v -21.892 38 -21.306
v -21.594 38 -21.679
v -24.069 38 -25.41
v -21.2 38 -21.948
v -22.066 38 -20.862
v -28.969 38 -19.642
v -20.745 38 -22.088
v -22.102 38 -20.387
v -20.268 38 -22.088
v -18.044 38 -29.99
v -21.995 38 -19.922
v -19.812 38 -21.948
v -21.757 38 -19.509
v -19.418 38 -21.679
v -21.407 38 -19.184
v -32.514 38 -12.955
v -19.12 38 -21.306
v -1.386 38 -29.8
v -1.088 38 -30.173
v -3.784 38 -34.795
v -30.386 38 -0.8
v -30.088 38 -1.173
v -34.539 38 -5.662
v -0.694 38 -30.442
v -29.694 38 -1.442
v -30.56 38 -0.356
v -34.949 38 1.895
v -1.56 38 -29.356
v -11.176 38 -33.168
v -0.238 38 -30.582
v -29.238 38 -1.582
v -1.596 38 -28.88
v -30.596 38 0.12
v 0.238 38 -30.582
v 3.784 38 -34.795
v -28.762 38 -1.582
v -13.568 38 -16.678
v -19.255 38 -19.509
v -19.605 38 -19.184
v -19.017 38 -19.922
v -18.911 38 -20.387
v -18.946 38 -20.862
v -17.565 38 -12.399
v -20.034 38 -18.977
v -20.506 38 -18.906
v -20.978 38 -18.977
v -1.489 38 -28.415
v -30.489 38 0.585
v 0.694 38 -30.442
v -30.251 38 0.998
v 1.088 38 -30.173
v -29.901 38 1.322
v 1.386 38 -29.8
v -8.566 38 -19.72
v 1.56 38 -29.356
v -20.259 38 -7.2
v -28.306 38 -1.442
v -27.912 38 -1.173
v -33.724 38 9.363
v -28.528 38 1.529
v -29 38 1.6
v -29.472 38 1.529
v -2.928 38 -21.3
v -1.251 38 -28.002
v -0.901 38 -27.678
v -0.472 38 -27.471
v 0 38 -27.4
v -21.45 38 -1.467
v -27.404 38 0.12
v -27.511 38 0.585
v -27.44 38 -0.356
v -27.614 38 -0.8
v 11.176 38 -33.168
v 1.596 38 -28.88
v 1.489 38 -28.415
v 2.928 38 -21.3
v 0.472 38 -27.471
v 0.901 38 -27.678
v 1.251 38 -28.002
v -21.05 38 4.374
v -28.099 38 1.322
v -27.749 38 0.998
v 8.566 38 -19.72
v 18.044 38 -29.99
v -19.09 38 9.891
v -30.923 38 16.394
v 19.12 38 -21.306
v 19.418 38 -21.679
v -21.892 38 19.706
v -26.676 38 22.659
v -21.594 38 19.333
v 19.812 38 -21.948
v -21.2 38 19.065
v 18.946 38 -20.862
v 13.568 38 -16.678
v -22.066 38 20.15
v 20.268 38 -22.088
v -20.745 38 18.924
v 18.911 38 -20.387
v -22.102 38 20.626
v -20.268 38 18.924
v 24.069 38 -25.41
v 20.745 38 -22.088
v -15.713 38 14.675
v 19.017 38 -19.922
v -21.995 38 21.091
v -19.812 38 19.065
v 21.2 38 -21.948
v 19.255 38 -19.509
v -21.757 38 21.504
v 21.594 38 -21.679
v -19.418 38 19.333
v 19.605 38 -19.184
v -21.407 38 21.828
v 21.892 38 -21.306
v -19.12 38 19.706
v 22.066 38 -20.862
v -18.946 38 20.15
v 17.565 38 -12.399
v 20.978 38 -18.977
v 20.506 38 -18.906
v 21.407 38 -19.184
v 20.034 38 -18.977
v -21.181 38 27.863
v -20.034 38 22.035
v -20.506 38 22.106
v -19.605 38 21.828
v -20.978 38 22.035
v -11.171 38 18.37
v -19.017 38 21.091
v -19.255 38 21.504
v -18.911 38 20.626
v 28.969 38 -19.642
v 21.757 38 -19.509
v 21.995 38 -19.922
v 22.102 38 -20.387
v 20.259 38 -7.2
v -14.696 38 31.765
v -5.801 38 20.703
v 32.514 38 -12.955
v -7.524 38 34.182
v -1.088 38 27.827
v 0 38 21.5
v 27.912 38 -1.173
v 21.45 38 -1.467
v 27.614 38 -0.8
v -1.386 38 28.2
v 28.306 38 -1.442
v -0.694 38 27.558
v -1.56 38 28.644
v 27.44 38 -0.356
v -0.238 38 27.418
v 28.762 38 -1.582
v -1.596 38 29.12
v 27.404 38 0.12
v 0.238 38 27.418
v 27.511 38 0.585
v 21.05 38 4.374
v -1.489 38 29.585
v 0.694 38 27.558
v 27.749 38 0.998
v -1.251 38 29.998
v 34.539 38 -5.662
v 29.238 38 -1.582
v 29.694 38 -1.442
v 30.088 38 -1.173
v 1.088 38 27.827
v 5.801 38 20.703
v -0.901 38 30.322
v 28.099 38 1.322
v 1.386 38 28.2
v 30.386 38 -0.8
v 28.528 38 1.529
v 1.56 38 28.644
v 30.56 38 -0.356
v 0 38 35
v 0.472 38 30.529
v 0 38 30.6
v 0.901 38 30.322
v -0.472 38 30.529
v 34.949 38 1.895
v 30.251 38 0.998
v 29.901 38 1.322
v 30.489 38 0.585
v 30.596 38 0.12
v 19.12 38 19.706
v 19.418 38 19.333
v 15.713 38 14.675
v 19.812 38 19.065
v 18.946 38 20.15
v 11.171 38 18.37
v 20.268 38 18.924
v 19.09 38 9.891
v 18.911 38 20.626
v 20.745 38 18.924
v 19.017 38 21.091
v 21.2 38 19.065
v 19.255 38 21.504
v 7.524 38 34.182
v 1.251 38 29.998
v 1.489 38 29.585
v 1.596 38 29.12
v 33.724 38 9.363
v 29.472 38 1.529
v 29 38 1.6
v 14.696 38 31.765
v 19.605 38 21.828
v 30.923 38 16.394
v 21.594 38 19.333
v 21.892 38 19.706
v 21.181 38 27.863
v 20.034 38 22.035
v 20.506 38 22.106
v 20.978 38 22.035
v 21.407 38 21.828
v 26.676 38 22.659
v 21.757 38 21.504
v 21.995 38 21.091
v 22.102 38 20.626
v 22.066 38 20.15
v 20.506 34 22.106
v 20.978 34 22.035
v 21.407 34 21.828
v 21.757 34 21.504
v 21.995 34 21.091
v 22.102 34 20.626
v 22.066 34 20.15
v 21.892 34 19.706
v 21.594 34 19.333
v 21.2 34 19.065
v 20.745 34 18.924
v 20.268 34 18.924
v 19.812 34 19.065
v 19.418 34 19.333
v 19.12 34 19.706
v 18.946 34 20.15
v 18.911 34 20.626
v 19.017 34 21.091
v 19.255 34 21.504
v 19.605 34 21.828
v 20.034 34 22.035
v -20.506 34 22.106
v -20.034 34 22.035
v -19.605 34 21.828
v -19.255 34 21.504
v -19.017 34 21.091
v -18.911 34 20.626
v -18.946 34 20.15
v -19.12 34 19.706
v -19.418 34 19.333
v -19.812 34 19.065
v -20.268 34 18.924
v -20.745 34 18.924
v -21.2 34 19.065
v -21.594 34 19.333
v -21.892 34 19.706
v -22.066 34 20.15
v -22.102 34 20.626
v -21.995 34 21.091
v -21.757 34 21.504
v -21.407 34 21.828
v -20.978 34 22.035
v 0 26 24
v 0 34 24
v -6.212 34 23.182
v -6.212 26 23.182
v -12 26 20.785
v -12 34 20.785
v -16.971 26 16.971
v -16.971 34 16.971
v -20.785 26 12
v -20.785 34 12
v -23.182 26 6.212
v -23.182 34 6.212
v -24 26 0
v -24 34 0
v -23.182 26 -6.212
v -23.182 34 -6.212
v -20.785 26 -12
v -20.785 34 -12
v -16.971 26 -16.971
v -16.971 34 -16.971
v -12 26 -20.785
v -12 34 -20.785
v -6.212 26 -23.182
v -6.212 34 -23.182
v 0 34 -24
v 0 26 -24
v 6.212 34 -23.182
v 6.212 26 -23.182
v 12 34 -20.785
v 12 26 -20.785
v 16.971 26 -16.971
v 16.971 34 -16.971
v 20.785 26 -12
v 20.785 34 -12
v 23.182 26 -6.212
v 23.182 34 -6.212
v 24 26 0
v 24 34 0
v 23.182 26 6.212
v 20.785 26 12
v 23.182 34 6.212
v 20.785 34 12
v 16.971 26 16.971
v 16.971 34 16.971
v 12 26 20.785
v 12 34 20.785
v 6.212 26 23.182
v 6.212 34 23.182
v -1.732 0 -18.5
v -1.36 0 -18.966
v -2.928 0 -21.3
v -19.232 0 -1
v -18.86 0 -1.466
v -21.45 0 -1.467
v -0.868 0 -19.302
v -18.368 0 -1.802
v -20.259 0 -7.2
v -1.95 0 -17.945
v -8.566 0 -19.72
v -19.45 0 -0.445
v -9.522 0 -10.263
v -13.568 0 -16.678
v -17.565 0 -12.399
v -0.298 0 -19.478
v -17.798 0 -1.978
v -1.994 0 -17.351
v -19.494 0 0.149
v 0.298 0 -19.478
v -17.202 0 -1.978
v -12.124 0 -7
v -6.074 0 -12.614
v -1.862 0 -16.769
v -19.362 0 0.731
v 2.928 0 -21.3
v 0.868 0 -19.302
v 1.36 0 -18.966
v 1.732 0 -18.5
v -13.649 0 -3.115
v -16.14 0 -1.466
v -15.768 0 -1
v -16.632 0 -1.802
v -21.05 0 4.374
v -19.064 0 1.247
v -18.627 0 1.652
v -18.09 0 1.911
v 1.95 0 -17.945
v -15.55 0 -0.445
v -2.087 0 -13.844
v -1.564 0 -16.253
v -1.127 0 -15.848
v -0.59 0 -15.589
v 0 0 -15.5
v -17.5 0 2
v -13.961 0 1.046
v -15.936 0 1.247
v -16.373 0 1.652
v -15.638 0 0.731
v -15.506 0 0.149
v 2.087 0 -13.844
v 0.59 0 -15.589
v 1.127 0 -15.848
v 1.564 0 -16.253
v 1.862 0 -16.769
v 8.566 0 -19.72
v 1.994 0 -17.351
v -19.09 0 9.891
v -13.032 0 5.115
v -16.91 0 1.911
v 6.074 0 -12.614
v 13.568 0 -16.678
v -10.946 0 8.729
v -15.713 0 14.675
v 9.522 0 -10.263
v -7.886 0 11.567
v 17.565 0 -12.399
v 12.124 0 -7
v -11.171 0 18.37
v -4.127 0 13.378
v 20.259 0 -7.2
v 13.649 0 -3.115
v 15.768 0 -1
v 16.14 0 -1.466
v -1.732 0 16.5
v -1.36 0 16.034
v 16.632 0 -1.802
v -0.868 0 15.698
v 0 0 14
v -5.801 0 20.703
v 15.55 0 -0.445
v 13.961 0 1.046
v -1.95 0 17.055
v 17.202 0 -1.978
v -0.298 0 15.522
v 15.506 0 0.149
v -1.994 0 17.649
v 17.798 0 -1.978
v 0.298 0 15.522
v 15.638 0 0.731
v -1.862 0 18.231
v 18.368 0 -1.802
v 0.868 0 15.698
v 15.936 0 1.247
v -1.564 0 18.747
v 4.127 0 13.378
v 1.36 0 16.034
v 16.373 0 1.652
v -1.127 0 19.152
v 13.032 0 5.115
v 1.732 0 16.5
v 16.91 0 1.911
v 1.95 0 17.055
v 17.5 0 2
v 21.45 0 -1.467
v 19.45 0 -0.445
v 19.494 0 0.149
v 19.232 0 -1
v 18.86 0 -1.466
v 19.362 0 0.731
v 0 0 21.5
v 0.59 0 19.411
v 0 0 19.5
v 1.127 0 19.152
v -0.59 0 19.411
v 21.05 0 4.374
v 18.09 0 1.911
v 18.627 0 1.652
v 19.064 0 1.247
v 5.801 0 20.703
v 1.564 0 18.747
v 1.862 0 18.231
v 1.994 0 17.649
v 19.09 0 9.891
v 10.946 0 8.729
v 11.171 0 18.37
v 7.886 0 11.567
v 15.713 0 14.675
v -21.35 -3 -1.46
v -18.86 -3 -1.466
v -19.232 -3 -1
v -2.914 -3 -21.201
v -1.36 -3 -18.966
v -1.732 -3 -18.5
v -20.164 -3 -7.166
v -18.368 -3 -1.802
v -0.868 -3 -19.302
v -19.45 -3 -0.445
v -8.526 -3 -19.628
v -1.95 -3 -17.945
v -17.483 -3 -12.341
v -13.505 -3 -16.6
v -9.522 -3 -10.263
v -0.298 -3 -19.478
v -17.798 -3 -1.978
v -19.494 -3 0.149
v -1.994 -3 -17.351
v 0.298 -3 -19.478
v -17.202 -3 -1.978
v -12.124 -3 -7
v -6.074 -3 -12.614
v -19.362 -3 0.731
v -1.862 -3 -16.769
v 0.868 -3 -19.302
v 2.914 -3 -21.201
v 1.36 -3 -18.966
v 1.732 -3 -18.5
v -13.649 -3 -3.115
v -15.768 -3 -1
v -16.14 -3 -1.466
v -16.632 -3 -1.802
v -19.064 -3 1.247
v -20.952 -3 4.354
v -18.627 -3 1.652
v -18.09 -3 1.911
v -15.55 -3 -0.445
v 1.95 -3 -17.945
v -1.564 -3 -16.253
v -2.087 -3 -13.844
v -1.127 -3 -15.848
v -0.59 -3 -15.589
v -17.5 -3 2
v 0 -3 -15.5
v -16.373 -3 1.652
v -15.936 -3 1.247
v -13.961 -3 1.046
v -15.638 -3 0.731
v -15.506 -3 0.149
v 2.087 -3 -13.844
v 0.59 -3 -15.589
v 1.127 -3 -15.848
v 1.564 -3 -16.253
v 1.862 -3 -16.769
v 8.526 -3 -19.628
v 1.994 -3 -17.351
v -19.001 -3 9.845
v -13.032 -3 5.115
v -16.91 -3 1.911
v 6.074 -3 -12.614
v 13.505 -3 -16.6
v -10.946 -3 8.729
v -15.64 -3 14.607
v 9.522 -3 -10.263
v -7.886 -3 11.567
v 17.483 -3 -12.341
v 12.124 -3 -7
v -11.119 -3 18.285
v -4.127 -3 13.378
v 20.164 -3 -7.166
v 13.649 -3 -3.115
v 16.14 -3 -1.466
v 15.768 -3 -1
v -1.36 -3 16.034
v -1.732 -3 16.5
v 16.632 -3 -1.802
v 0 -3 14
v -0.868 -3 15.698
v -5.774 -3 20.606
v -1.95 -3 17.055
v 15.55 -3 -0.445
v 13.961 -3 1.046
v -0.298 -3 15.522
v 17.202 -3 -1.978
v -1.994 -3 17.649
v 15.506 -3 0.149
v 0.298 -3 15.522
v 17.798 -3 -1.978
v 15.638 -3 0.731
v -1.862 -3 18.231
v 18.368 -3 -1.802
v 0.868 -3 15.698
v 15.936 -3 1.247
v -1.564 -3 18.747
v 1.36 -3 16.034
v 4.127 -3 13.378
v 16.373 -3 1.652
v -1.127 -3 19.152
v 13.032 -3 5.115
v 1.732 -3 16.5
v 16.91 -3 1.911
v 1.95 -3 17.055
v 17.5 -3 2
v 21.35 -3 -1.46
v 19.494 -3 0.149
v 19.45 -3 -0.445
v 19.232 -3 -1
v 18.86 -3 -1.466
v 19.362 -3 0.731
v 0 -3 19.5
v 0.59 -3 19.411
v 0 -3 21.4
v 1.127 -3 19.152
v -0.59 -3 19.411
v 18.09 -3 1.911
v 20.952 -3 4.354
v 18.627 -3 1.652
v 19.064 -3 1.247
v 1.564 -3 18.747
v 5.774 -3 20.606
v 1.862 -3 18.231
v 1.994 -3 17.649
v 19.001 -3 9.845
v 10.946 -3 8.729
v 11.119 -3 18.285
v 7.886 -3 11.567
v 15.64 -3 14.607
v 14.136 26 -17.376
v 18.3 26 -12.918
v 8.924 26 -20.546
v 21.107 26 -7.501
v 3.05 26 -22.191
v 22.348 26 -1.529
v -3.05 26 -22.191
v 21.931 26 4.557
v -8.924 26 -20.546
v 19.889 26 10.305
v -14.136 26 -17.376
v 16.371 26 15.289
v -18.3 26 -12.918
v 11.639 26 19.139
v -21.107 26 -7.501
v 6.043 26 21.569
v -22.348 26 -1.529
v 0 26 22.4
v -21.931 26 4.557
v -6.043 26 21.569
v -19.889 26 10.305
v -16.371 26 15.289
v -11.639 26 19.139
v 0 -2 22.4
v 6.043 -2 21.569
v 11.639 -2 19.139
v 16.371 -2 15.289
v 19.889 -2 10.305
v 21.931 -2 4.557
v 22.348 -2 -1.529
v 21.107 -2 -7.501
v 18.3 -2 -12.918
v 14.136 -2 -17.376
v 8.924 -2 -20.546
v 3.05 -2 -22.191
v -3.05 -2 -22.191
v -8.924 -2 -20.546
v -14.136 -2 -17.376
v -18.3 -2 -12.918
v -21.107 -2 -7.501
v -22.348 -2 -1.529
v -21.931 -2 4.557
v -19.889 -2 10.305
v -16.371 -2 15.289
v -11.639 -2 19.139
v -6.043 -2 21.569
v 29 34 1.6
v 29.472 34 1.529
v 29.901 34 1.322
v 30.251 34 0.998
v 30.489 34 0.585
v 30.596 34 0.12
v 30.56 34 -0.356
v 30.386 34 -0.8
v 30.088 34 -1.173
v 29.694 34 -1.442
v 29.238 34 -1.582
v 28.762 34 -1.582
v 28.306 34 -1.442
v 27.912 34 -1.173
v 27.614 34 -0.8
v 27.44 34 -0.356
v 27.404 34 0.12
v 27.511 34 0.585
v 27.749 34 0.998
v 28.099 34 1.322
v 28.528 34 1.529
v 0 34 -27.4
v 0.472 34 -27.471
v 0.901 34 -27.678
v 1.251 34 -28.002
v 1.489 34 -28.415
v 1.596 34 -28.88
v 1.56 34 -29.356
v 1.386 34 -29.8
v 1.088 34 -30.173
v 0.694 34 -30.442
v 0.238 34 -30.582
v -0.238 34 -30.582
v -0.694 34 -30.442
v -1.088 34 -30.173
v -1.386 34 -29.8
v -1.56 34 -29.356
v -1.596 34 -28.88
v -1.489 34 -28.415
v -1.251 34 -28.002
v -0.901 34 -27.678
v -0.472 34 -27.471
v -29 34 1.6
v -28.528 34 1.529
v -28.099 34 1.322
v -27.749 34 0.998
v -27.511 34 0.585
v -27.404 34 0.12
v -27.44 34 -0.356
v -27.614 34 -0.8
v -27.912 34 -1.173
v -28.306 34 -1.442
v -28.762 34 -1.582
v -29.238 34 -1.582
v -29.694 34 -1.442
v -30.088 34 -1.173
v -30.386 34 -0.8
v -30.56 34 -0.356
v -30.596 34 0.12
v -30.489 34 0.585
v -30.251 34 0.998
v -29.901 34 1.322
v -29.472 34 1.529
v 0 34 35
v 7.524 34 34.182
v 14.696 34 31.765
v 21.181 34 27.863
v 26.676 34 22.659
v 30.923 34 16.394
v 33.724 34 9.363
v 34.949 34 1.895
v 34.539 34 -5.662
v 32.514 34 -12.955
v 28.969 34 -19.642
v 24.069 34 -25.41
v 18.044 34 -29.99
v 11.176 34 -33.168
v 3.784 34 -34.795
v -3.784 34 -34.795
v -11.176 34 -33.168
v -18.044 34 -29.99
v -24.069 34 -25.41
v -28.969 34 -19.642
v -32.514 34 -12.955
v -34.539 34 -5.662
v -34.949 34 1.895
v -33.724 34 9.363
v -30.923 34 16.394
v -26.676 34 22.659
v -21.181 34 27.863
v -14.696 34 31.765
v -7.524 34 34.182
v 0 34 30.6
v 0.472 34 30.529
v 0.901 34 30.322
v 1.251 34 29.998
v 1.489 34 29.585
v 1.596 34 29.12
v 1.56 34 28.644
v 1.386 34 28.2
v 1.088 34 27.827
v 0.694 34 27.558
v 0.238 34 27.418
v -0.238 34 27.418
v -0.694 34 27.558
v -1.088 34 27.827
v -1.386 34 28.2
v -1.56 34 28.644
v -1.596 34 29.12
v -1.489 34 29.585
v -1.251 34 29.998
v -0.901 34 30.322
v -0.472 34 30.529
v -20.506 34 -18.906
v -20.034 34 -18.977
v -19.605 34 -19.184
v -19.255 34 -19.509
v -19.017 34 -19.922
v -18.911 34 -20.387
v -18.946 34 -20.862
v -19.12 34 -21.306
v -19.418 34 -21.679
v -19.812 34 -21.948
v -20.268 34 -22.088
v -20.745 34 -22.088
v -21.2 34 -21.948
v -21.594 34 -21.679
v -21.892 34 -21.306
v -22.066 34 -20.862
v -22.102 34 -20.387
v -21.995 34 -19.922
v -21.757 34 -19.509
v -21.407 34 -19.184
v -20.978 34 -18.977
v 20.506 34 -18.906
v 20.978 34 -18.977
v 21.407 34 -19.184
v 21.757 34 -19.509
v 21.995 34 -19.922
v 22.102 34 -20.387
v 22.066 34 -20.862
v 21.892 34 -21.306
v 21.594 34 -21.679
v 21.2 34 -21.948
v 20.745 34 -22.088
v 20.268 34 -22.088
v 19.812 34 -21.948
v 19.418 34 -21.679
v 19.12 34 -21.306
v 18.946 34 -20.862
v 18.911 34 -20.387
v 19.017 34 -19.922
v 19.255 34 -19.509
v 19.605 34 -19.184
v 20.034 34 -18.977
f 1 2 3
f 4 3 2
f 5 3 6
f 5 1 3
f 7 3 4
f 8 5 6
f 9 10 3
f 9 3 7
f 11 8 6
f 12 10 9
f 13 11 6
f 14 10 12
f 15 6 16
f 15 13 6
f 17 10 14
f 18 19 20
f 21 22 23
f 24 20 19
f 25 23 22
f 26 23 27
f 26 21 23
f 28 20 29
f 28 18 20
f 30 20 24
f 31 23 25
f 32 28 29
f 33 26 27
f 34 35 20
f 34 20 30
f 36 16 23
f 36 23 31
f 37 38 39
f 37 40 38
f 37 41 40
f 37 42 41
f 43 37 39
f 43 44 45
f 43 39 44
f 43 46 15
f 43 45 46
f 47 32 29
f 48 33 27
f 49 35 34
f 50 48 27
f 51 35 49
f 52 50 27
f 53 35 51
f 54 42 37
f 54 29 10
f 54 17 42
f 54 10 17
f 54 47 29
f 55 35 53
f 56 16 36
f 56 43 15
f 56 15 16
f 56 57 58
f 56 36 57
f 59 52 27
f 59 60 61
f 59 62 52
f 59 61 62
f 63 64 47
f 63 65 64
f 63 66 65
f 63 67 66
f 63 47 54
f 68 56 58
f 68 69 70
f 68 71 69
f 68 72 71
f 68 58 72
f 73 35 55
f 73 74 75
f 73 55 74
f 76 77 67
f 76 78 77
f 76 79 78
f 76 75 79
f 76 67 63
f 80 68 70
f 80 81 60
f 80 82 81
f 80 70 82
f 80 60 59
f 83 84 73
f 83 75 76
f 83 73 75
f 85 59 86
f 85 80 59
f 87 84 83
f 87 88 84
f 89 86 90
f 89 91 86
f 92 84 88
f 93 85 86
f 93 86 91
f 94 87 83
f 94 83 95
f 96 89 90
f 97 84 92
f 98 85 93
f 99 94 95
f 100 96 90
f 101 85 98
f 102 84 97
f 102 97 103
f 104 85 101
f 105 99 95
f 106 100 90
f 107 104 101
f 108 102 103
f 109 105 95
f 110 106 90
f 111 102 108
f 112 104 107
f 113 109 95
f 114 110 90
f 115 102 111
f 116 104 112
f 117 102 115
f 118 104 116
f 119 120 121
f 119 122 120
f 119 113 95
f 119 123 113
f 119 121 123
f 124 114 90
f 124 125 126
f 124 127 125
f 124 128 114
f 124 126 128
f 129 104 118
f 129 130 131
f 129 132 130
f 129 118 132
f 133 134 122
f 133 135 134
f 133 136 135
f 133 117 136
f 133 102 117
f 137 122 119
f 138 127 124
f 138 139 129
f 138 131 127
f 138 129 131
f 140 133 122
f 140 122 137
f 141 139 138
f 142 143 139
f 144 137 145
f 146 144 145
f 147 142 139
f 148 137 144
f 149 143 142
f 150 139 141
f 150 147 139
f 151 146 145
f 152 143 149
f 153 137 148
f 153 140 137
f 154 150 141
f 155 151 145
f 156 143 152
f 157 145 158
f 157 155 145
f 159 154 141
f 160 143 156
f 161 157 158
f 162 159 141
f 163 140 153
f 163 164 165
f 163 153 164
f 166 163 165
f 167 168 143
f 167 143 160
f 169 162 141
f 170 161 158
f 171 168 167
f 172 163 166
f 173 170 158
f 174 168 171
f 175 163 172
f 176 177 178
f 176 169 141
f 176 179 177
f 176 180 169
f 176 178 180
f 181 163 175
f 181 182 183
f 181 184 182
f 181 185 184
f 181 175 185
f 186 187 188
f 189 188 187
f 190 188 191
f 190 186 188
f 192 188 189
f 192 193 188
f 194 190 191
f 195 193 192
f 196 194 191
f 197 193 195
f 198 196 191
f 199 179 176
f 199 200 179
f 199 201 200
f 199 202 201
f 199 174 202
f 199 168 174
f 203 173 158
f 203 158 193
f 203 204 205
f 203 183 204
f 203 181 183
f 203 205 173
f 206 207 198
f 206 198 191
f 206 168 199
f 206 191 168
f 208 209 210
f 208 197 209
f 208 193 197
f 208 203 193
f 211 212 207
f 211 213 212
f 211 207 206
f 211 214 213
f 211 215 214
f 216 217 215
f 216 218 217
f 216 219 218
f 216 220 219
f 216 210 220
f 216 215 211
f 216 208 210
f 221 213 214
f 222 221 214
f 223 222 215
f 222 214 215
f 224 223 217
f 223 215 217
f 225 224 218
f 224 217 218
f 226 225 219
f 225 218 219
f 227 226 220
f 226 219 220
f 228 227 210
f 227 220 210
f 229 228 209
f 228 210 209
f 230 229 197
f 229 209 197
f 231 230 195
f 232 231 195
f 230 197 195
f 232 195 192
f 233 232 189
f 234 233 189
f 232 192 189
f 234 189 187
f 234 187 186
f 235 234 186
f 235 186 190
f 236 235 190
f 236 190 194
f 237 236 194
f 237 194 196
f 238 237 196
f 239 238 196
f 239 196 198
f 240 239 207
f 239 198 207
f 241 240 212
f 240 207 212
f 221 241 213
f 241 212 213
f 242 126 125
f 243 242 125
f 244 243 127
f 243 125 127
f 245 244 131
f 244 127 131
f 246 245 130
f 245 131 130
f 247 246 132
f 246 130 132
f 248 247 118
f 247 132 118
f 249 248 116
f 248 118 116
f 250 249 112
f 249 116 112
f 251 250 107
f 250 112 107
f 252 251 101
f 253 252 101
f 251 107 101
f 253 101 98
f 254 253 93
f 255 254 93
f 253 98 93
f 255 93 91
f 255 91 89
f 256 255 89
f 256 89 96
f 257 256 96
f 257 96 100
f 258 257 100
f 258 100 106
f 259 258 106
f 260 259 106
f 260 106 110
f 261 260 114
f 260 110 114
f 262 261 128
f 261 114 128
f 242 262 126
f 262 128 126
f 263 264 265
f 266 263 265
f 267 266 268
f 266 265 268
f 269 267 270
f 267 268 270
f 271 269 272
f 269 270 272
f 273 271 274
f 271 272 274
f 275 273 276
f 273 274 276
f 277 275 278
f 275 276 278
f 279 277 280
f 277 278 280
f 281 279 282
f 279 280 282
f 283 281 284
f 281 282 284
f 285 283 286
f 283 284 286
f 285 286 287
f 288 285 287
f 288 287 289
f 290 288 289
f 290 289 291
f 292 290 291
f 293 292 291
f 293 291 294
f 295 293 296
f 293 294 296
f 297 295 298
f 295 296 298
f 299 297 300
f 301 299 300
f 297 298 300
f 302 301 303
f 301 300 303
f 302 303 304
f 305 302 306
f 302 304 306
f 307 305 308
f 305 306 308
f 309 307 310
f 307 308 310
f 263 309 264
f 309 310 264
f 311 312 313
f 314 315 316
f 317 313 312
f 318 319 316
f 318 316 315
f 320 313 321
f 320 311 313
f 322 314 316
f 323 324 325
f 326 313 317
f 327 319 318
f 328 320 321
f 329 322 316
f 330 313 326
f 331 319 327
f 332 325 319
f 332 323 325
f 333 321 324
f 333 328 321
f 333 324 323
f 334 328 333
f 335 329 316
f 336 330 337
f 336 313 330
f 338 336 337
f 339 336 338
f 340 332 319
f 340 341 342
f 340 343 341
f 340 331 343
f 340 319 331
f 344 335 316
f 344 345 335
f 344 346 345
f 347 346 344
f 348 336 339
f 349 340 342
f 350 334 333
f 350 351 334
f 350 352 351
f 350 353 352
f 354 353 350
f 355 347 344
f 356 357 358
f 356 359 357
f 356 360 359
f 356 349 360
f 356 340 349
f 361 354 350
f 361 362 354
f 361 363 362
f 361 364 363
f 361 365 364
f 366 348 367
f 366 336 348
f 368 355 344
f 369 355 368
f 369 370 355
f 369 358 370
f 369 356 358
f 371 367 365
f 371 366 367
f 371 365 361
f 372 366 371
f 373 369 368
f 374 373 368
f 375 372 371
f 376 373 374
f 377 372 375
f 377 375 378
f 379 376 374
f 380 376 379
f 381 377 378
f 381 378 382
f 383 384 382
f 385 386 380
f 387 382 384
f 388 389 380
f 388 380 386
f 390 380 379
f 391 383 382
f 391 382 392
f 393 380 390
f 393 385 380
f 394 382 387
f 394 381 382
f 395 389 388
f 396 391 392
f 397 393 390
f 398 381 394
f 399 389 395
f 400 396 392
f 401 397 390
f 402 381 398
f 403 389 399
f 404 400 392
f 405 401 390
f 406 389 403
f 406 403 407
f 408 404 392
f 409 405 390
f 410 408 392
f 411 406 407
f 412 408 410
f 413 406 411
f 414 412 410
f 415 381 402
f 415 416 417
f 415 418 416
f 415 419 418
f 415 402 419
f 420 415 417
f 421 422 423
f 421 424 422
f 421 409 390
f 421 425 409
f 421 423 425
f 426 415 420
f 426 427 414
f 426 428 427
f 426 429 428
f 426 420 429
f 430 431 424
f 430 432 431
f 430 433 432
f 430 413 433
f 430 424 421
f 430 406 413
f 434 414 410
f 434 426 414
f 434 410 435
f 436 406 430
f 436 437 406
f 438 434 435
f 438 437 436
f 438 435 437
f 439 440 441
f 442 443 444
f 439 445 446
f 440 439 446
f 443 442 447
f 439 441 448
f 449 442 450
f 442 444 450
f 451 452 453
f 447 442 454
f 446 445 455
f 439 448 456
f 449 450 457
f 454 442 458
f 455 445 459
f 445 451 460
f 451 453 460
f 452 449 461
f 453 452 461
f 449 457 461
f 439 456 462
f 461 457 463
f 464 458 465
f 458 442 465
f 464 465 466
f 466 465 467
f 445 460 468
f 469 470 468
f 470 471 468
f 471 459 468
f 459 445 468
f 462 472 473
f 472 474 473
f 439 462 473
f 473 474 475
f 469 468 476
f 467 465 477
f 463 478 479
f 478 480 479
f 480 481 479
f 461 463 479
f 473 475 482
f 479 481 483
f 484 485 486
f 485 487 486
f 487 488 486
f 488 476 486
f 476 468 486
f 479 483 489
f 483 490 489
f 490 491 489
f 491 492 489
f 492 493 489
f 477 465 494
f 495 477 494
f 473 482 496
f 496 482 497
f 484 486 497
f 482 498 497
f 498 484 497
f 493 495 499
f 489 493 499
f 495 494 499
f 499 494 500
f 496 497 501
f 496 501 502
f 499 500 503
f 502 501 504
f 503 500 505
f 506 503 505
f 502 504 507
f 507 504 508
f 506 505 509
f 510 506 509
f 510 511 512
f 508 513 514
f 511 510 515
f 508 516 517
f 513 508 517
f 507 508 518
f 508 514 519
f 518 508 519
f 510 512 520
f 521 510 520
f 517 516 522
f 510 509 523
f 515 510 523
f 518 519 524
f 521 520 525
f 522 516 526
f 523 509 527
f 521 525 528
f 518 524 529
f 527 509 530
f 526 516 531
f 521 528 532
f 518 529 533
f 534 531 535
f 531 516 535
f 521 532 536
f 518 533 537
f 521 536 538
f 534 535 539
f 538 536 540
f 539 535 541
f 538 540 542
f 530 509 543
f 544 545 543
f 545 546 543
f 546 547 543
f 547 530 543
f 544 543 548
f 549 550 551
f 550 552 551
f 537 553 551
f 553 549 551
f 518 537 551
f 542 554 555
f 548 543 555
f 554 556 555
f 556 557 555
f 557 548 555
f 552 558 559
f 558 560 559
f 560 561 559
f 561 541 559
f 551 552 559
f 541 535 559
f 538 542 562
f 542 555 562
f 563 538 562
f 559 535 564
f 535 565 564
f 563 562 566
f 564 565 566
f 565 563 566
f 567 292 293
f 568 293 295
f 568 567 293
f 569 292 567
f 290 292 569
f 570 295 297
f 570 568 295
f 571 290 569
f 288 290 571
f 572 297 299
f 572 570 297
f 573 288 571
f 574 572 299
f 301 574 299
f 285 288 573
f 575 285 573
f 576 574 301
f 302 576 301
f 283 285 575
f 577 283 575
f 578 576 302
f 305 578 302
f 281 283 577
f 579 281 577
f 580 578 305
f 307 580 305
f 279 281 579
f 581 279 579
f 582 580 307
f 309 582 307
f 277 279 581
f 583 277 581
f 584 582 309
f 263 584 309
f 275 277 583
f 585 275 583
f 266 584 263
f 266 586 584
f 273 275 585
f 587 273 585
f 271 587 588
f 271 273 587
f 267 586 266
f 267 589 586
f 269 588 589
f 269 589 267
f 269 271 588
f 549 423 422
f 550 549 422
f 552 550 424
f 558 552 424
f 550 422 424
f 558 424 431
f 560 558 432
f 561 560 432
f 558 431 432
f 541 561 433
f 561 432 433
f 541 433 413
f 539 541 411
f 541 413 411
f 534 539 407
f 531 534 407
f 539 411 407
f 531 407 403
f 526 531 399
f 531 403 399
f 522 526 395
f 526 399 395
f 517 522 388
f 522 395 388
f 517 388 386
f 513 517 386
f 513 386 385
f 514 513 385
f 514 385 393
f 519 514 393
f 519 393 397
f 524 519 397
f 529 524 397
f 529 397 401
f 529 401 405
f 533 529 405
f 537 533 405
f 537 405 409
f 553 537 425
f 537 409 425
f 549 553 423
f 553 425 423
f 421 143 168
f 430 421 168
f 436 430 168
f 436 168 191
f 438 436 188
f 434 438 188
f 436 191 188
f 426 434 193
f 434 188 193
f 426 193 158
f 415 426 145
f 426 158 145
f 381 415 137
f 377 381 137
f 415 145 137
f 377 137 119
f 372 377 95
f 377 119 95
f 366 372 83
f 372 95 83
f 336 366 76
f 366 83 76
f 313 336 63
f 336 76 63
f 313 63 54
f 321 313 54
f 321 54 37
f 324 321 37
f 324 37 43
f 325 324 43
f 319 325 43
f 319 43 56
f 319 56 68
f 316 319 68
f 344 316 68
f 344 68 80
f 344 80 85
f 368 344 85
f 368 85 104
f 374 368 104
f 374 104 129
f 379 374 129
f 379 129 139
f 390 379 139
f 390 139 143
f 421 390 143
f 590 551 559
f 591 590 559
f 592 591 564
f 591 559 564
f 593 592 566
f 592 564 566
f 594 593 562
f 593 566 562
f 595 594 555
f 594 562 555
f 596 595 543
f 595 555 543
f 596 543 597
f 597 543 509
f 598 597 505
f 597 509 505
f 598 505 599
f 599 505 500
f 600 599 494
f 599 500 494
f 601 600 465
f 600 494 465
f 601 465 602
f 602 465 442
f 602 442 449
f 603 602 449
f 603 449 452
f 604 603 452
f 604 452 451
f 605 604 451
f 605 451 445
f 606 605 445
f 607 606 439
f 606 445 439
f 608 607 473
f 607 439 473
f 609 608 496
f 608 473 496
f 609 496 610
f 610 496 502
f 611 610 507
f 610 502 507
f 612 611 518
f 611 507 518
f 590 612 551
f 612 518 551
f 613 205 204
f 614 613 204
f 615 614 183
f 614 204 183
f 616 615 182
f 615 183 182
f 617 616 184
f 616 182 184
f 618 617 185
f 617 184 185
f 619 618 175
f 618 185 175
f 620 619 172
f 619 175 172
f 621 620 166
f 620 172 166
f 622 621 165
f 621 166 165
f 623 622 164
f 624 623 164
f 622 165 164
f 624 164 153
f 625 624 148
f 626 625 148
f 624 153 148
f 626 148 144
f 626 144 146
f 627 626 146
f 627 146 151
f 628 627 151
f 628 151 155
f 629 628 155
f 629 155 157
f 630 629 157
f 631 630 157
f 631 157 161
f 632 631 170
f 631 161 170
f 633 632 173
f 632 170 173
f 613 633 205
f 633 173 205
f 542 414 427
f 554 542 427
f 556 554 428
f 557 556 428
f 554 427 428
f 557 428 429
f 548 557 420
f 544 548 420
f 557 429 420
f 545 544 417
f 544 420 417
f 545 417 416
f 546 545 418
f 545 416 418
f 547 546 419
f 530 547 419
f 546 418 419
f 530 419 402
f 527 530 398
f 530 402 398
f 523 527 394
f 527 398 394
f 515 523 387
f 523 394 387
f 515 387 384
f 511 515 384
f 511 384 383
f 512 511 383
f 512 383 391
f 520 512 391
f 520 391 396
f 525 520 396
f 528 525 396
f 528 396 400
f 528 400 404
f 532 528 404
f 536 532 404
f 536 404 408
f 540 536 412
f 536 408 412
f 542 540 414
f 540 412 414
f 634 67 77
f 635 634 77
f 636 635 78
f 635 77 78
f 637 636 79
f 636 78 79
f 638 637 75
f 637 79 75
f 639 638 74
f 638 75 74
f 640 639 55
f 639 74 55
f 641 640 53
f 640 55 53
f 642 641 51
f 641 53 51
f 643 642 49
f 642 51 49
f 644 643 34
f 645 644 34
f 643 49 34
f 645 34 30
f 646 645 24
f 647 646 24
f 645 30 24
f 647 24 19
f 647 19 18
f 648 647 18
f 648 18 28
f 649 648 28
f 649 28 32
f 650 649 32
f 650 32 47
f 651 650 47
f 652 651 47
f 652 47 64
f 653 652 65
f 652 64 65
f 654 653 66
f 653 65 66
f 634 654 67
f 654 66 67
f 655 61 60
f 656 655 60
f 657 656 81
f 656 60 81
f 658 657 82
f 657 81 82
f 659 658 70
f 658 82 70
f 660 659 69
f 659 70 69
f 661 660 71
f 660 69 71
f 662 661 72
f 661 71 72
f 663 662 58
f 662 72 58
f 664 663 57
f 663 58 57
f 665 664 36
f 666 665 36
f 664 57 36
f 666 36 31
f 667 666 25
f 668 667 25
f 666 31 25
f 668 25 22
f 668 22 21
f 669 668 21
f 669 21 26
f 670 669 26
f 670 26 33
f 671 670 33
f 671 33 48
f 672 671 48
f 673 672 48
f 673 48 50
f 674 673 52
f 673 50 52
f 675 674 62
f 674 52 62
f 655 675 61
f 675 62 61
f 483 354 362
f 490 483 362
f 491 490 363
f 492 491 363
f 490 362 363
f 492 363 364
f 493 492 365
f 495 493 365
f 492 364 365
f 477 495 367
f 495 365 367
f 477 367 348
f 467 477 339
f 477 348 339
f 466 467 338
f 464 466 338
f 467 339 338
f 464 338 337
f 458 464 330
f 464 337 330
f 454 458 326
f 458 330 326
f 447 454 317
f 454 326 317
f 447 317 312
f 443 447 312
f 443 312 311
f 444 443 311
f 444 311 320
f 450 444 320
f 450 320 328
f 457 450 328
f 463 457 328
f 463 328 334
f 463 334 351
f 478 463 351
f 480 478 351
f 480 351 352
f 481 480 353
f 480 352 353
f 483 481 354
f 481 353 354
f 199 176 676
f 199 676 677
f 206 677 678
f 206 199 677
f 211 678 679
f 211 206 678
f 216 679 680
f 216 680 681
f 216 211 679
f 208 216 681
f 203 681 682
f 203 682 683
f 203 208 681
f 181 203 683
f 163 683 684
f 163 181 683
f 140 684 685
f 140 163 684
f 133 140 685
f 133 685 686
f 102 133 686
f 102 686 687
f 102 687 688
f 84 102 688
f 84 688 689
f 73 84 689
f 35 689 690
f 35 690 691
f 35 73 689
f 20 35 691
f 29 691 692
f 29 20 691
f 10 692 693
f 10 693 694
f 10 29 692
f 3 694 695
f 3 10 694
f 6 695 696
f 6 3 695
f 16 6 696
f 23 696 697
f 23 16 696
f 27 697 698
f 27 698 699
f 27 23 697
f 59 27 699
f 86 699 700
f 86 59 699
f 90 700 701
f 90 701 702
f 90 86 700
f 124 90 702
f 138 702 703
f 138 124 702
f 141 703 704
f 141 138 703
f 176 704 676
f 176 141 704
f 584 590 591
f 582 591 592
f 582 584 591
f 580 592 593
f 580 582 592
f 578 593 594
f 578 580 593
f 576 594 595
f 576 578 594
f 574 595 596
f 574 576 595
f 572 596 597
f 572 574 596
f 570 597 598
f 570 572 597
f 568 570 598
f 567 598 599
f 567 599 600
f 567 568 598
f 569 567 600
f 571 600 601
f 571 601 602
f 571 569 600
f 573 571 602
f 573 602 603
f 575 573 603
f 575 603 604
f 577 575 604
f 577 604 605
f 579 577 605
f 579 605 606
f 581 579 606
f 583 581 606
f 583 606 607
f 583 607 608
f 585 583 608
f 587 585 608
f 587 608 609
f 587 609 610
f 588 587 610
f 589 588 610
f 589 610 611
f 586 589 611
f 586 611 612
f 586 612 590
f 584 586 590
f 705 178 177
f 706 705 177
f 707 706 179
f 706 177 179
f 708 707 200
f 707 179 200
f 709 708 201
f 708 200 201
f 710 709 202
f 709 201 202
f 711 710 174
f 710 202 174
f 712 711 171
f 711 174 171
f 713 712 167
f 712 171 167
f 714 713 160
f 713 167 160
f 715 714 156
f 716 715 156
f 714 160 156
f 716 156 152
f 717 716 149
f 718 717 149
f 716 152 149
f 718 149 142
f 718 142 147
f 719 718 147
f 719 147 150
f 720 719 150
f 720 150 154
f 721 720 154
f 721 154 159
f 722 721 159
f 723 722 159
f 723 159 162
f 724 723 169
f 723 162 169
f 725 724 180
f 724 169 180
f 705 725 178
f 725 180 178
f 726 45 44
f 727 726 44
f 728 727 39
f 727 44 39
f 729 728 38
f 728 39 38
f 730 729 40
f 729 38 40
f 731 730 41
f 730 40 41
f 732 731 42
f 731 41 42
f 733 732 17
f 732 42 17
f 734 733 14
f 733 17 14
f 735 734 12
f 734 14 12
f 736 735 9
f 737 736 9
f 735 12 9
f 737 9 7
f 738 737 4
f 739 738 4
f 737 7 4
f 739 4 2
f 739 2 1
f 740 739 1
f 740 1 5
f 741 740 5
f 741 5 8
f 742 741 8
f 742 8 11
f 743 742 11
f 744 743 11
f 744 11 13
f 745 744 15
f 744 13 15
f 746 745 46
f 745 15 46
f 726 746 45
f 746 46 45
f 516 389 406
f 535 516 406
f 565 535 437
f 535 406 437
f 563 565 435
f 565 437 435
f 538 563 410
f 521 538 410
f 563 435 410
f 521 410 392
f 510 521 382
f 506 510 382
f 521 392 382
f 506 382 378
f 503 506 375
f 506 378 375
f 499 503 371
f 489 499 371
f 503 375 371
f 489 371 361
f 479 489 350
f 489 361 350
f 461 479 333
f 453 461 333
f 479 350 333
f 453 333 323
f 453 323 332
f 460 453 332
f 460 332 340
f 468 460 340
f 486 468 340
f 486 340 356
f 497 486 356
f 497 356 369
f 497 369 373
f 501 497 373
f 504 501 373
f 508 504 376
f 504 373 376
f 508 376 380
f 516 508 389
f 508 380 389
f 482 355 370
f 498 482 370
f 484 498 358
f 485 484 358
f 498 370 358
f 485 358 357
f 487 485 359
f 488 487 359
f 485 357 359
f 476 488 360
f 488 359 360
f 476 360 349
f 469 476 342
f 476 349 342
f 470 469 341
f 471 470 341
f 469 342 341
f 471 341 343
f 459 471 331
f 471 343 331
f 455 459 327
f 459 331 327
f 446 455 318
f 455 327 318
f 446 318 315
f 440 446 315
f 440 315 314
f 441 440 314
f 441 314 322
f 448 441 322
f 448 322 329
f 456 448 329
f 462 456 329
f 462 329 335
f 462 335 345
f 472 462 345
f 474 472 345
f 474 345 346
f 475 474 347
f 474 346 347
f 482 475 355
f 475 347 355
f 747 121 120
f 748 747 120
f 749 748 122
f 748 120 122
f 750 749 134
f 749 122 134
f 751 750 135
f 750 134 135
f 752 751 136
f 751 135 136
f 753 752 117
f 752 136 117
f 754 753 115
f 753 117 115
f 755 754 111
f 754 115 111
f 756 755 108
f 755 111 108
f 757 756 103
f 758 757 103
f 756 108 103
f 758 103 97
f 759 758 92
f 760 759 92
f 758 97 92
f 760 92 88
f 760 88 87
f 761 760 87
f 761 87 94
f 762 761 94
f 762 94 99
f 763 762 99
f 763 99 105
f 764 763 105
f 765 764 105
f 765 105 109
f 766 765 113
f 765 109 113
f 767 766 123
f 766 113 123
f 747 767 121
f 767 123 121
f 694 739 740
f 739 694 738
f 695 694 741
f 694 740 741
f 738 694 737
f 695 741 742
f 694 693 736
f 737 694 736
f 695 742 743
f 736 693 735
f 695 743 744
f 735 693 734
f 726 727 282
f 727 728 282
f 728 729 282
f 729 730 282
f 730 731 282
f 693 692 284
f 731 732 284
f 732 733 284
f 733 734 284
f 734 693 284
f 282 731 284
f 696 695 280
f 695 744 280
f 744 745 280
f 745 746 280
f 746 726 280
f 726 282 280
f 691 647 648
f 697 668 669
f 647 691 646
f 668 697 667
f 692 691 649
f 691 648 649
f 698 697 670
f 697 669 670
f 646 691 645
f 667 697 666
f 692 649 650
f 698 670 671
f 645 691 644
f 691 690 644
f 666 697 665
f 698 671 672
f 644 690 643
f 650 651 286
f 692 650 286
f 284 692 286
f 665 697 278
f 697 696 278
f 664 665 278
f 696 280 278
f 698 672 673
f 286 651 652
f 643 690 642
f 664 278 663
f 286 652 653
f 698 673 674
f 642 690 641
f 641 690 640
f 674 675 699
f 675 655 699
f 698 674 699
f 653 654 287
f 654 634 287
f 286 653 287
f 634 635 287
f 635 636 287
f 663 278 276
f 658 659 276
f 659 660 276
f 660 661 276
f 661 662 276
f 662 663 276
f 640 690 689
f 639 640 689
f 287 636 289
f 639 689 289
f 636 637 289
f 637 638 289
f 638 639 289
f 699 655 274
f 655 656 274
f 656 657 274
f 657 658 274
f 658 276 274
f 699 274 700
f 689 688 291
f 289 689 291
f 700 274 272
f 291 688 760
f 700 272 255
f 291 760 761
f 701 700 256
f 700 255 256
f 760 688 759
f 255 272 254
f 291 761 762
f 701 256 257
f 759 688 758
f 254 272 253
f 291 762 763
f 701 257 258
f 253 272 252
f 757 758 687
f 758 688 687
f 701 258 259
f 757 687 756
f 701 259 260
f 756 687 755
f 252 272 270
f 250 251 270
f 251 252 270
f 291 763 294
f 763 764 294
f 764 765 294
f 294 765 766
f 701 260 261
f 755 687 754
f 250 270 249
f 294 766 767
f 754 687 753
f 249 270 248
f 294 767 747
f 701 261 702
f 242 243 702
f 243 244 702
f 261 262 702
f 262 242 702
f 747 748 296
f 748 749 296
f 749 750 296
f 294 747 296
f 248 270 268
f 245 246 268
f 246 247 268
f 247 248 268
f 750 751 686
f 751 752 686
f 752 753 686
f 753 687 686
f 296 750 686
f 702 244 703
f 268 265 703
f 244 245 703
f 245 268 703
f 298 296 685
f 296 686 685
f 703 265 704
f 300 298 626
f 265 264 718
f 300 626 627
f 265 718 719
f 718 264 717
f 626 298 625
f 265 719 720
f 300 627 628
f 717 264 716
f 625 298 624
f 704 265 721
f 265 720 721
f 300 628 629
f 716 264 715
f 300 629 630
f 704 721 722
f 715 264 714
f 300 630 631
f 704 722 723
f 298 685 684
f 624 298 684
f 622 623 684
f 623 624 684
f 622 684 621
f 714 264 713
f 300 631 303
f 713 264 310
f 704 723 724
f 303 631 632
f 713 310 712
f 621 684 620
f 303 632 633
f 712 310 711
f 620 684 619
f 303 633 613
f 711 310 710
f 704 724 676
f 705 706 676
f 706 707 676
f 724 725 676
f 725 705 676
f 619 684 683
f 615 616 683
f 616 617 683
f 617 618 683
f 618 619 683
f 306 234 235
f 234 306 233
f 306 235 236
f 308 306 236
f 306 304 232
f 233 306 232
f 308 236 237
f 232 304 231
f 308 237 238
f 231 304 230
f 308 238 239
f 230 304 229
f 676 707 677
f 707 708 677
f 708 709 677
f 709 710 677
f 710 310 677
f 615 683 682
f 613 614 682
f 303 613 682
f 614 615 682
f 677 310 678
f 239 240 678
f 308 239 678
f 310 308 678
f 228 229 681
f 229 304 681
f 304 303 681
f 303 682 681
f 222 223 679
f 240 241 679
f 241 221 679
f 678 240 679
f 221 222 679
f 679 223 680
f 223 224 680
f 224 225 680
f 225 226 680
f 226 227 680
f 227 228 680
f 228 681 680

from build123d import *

# Parameters (mm, degrees)
SKETCH_1_R      = 22.4
SKETCH_1_R_2    = 2
SKETCH_1_R_3    = 14
EXTRUDE_1_DEPTH = 3
EXTRUDE_START   = 34
SKETCH_1_3_R    = 22.4
SKETCH_1_3_R_2  = 21.5
EXTRUDE_2_DEPTH = 34
EXTRUDE_START_2 = 4
SKETCH_2_R      = 35
SKETCH_2_R_2    = 21.5
SKETCH_2_R_3    = 1.6
EXTRUDE_3_DEPTH = 4
SKETCH_3_R      = 24
SKETCH_3_R_2    = 22.4
EXTRUDE_4_DEPTH = 8
CHAMFER_1_SIZE  = 1


with BuildPart() as part:
    # 草图1 → 凸台-拉伸1 (new body)
    with BuildSketch(Plane(origin=(0, 0, 0), x_dir=(1, 0, 0), z_dir=(0, 1, 0))):
        Circle(SKETCH_1_R)
        with Locations((0, -17.5)):
            Circle(SKETCH_1_R_2, mode=Mode.SUBTRACT)
        with Locations((-17.5, 0)):
            Circle(SKETCH_1_R_2, mode=Mode.SUBTRACT)
        Circle(SKETCH_1_R_3, mode=Mode.SUBTRACT)
        with Locations((17.5, 0)):
            Circle(SKETCH_1_R_2, mode=Mode.SUBTRACT)
        with Locations((0, 17.5)):
            Circle(SKETCH_1_R_2, mode=Mode.SUBTRACT)
    extrude(amount=-EXTRUDE_1_DEPTH)

    # 草图1<3> → 凸台-拉伸2 (add)
    with BuildSketch(Plane(origin=(0, 0, 0), x_dir=(1, 0, 0), z_dir=(0, 1, 0)).offset(EXTRUDE_START)):
        Circle(SKETCH_1_3_R)
        Circle(SKETCH_1_3_R_2, mode=Mode.SUBTRACT)
    extrude(amount=-EXTRUDE_2_DEPTH)

    # 草图2 → 凸台-拉伸3 (add)
    with BuildSketch(Plane(origin=(0, 34, 0), x_dir=(1, 0, 0), z_dir=(0, 1, 0)).offset(EXTRUDE_START_2)):
        Circle(SKETCH_2_R)
        Circle(SKETCH_2_R_2, mode=Mode.SUBTRACT)
        with Locations((29, 0)):
            Circle(SKETCH_2_R_3, mode=Mode.SUBTRACT)
        with Locations((20.506096654, -20.506096654)):
            Circle(SKETCH_2_R_3, mode=Mode.SUBTRACT)
        with Locations((0, -29)):
            Circle(SKETCH_2_R_3, mode=Mode.SUBTRACT)
        with Locations((-20.506096654, -20.506096654)):
            Circle(SKETCH_2_R_3, mode=Mode.SUBTRACT)
        with Locations((-29, 0)):
            Circle(SKETCH_2_R_3, mode=Mode.SUBTRACT)
        with Locations((-20.506096654, 20.506096654)):
            Circle(SKETCH_2_R_3, mode=Mode.SUBTRACT)
        with Locations((0, 29)):
            Circle(SKETCH_2_R_3, mode=Mode.SUBTRACT)
        with Locations((20.506096654, 20.506096654)):
            Circle(SKETCH_2_R_3, mode=Mode.SUBTRACT)
    extrude(amount=-EXTRUDE_3_DEPTH)

    # 草图3 → 凸台-拉伸4 (add)
    with BuildSketch(Plane.XZ.offset(-34)):
        Circle(SKETCH_3_R)
        Circle(SKETCH_3_R_2, mode=Mode.SUBTRACT)
    extrude(amount=EXTRUDE_4_DEPTH)

    # 倒角1
    chamfer_1_edges = [part.edges().sort_by_distance(p)[0] for p in [
        (-22.4, -3, 0),
    ]]
    chamfer(chamfer_1_edges, length=CHAMFER_1_SIZE)


solid = part.part
